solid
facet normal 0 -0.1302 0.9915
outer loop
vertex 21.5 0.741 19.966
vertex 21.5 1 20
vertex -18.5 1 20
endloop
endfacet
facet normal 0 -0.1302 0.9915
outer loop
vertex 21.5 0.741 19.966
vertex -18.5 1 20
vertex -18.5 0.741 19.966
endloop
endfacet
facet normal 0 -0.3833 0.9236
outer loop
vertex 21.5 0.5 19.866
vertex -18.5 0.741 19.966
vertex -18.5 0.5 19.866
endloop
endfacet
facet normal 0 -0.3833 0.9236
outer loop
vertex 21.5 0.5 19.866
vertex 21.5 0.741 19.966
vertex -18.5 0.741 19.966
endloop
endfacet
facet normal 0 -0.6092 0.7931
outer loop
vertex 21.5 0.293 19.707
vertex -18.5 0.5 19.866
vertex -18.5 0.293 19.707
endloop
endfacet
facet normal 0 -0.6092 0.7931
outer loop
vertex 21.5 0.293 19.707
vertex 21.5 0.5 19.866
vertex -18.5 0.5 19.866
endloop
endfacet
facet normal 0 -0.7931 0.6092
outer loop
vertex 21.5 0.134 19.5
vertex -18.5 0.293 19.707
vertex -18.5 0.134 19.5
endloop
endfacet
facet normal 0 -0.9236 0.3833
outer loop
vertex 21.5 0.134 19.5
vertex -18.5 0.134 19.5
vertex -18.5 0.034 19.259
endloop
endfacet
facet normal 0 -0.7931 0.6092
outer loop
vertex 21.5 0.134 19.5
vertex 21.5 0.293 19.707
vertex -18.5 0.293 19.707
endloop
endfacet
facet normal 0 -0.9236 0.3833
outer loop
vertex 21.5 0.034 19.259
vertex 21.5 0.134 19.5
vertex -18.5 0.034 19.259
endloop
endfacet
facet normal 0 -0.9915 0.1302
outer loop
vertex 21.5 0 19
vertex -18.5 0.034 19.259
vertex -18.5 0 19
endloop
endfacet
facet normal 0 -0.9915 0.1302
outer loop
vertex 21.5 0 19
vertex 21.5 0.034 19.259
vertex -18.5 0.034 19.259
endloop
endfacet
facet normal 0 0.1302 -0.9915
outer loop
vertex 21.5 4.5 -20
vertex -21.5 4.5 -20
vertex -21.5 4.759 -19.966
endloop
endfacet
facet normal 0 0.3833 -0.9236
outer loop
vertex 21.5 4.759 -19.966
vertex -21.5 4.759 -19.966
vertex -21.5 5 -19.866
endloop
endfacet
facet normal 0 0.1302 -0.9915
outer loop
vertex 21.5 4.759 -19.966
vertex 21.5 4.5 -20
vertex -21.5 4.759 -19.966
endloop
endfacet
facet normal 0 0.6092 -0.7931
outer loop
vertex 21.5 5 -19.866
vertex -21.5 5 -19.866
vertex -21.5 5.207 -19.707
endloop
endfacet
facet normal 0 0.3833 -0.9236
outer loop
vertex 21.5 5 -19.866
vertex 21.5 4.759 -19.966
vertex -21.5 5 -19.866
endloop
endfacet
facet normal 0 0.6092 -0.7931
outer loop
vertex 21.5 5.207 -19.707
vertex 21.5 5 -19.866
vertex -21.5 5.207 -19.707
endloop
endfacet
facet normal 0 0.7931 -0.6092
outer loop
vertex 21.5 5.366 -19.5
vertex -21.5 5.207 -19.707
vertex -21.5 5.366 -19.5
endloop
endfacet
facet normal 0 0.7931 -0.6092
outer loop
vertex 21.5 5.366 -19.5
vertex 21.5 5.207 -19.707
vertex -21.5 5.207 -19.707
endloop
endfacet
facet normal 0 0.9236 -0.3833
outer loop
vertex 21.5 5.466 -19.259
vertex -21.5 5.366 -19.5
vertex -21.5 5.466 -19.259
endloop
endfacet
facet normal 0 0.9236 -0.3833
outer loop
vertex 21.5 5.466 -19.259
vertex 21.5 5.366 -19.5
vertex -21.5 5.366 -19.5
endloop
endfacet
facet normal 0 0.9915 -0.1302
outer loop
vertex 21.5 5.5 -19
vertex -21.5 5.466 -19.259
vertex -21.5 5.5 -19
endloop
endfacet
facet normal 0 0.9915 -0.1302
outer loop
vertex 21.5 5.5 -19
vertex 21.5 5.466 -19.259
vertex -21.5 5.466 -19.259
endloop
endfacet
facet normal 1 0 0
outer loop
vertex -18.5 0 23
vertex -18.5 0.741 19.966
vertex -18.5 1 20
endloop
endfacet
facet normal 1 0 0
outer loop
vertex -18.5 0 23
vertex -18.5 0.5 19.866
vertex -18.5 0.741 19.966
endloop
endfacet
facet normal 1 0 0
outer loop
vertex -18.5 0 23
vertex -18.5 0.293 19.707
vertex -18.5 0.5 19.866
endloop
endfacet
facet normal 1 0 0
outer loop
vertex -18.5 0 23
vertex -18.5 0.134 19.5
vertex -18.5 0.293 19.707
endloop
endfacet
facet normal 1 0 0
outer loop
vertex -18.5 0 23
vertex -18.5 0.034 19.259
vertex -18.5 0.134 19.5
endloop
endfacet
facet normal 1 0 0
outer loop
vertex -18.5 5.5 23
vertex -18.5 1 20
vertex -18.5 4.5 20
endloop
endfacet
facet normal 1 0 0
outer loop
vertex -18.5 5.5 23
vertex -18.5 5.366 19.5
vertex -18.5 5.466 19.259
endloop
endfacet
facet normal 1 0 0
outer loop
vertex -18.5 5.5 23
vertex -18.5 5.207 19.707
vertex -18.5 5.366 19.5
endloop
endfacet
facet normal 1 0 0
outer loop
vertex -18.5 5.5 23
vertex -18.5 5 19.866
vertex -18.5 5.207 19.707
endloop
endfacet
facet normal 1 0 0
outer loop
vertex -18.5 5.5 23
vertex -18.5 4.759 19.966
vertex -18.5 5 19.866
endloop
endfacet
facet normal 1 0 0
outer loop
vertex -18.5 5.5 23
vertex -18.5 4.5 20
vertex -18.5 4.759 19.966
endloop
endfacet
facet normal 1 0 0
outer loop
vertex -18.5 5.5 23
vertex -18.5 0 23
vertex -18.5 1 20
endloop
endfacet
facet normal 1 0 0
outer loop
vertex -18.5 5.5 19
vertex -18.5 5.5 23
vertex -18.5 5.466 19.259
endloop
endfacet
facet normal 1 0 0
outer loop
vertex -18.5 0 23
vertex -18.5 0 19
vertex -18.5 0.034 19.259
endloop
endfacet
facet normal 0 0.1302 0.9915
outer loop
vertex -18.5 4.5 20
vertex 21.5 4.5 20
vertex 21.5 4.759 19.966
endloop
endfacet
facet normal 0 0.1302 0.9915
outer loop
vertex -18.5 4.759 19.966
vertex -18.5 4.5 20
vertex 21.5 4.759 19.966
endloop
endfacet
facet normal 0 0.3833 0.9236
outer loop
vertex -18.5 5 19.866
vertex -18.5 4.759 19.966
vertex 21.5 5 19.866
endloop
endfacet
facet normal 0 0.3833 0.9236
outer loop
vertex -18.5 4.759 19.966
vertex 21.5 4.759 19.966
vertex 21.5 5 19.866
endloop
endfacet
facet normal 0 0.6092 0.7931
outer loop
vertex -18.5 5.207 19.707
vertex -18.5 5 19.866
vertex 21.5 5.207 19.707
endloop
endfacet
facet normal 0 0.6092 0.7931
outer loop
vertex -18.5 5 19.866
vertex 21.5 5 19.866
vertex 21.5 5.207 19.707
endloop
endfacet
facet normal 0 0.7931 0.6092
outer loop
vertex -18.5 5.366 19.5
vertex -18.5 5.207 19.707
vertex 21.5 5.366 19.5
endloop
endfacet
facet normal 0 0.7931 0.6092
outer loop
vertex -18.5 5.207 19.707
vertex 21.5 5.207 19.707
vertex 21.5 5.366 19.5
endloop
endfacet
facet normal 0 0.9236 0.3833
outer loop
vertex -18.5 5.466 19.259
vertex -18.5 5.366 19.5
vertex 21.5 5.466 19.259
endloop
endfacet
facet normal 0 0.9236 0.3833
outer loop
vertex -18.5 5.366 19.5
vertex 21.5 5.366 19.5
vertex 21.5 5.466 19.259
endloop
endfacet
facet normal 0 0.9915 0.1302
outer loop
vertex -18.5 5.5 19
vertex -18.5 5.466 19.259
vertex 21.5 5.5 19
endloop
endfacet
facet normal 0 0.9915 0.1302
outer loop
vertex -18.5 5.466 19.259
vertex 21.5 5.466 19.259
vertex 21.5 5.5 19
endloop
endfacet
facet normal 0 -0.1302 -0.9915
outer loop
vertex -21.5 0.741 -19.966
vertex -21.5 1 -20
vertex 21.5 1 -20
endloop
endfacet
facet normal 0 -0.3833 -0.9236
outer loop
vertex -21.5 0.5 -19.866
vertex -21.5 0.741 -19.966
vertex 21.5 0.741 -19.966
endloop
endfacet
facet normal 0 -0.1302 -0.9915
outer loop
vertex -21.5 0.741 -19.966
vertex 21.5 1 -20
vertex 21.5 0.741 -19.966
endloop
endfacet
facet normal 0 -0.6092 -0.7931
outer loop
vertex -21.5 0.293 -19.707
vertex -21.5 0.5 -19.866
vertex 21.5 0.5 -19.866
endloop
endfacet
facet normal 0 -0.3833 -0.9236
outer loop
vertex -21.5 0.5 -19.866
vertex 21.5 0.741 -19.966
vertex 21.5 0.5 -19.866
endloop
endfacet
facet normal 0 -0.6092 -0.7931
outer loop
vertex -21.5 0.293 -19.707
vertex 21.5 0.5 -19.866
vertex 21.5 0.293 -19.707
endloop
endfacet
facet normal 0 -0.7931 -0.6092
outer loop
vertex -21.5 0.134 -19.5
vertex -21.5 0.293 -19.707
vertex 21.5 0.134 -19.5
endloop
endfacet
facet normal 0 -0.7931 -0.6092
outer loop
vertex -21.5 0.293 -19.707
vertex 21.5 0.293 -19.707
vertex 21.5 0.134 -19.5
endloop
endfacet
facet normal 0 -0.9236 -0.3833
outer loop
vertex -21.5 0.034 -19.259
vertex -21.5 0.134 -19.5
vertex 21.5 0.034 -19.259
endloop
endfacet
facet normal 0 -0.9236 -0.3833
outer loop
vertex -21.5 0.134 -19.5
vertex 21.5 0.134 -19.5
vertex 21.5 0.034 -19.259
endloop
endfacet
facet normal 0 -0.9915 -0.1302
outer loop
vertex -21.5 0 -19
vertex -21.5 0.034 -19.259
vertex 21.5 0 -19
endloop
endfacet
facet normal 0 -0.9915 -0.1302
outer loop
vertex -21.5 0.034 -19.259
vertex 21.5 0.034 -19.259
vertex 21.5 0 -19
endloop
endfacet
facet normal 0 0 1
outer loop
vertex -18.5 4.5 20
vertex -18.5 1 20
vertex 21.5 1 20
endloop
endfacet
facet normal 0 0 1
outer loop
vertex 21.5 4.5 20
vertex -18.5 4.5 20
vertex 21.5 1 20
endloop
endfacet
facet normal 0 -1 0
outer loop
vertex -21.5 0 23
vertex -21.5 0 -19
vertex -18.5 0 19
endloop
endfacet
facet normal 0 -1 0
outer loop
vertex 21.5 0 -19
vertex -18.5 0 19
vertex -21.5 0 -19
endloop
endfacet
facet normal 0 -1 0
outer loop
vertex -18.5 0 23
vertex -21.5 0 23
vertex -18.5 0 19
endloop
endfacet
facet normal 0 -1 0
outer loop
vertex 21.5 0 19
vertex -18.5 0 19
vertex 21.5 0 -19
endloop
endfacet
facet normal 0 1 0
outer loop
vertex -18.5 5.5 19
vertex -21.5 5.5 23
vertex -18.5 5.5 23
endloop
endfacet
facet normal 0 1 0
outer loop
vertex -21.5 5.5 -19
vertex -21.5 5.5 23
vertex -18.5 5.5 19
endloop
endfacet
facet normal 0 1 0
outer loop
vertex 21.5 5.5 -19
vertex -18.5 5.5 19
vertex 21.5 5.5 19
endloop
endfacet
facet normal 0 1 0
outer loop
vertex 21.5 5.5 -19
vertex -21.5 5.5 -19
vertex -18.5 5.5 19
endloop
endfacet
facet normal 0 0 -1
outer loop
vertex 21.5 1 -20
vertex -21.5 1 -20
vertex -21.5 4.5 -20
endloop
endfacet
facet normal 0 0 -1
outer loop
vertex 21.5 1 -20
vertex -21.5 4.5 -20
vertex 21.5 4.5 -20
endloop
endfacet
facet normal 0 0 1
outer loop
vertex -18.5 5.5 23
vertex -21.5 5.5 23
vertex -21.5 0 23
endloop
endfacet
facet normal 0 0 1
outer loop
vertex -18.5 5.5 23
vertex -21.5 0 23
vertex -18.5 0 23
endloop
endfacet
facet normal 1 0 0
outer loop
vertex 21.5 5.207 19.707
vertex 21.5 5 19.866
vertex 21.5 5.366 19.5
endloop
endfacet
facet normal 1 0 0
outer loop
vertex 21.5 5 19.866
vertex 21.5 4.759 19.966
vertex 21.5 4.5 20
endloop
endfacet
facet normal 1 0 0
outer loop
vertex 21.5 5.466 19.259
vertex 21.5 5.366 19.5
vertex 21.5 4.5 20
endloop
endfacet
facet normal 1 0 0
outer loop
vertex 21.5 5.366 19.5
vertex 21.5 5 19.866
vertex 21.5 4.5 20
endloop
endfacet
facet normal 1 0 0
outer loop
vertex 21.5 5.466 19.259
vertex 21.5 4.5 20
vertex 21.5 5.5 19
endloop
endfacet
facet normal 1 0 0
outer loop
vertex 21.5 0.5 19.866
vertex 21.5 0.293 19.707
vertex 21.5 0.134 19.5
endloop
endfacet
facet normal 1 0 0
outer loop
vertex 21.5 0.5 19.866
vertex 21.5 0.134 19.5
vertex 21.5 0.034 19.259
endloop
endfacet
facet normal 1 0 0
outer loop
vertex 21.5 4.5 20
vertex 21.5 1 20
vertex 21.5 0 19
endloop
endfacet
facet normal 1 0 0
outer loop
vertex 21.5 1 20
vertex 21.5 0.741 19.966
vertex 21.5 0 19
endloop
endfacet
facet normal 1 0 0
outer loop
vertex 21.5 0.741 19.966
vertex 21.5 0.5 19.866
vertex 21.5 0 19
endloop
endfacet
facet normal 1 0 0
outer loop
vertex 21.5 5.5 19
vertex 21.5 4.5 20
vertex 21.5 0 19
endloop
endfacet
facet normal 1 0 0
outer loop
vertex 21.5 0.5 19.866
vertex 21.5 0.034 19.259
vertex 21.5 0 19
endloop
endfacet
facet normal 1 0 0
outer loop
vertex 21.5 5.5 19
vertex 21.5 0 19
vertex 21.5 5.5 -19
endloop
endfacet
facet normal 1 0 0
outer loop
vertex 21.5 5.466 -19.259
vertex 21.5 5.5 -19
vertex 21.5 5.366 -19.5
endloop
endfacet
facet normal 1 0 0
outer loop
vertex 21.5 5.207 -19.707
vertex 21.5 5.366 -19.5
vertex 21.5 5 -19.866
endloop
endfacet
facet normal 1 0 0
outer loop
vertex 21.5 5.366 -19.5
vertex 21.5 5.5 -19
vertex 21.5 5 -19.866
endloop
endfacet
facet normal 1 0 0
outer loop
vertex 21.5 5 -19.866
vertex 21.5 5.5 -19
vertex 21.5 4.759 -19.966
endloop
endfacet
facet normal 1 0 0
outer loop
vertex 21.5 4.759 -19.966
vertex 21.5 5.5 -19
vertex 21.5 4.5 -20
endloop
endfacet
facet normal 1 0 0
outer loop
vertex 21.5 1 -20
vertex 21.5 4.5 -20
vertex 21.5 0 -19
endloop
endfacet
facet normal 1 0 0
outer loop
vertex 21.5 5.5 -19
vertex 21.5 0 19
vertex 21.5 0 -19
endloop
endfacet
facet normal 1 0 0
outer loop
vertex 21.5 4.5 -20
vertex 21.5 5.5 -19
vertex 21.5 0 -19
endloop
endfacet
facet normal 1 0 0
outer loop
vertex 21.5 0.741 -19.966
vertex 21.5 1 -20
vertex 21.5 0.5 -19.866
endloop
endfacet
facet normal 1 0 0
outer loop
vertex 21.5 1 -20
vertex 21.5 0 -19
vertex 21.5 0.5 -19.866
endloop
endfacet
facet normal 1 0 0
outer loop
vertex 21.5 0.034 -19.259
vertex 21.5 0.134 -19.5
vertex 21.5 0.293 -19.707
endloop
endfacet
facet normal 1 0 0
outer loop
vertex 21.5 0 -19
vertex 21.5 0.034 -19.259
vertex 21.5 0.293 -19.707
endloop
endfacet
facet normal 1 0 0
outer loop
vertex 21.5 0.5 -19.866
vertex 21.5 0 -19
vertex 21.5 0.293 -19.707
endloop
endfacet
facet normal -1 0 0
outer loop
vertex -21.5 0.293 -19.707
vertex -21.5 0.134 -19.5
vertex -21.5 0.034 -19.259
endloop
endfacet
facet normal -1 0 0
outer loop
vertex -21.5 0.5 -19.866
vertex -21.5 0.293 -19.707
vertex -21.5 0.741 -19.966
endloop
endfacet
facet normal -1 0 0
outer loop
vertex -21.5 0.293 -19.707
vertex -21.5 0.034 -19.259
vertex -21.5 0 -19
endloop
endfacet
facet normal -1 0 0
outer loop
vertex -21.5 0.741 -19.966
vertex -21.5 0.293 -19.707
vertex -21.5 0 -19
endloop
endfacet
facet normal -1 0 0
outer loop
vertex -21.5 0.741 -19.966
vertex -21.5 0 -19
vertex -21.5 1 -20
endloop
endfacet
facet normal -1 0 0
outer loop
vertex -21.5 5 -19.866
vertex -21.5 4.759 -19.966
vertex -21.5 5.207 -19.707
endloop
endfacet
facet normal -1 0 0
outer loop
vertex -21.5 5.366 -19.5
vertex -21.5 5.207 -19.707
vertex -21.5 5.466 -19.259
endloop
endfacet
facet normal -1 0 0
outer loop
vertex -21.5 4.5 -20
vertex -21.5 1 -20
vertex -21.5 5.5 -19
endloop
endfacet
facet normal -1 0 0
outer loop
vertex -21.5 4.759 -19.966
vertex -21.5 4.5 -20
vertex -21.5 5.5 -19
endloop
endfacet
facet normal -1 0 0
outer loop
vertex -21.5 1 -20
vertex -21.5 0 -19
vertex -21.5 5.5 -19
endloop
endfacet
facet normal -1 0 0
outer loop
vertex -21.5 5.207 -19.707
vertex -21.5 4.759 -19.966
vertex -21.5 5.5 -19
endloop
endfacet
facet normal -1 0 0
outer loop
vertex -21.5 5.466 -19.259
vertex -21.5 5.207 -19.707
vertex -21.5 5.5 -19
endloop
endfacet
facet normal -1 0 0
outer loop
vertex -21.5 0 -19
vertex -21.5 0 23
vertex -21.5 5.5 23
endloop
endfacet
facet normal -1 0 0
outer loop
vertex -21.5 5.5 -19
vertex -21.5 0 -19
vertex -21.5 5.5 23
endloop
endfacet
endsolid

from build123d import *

# Parameters (mm, degrees)
SKETCH1_W                = 43
SKETCH1_H                = 40
BOSS_EXTRUDE1_DEPTH      = 5.5
FILLET1_R                = 1
SKETCH2_W                = 3
SKETCH2_H                = 5.5
BOSS_EXTRUDE2_DEPTH      = 3
BOSS_EXTRUDE2_DEPTH_BACK = 3


with BuildPart() as part:
    # Sketch1 → Boss-Extrude1 (new body)
    with BuildSketch(Plane(origin=(0, 0, 0), x_dir=(1, 0, 0), z_dir=(0, 1, 0))):
        Rectangle(SKETCH1_W, SKETCH1_H)
    extrude(amount=BOSS_EXTRUDE1_DEPTH)

    # Fillet1
    fillet1_edges = [part.edges().sort_by_distance(p)[0] for p in [
        (0, 5.5, -20),
        (0, 0, -20),
        (0, 0, 20),
        (0, 5.5, 20),
    ]]
    fillet(fillet1_edges, radius=FILLET1_R)

    # Sketch2 → Boss-Extrude2 (add, two sides)
    with BuildSketch(Plane.XY.offset(20)) as boss_extrude2_sk:
        with Locations((-20, 2.75)):
            Rectangle(SKETCH2_W, SKETCH2_H)
    extrude(amount=BOSS_EXTRUDE2_DEPTH)
    extrude(boss_extrude2_sk.sketch, amount=-BOSS_EXTRUDE2_DEPTH_BACK)


solid = part.part
